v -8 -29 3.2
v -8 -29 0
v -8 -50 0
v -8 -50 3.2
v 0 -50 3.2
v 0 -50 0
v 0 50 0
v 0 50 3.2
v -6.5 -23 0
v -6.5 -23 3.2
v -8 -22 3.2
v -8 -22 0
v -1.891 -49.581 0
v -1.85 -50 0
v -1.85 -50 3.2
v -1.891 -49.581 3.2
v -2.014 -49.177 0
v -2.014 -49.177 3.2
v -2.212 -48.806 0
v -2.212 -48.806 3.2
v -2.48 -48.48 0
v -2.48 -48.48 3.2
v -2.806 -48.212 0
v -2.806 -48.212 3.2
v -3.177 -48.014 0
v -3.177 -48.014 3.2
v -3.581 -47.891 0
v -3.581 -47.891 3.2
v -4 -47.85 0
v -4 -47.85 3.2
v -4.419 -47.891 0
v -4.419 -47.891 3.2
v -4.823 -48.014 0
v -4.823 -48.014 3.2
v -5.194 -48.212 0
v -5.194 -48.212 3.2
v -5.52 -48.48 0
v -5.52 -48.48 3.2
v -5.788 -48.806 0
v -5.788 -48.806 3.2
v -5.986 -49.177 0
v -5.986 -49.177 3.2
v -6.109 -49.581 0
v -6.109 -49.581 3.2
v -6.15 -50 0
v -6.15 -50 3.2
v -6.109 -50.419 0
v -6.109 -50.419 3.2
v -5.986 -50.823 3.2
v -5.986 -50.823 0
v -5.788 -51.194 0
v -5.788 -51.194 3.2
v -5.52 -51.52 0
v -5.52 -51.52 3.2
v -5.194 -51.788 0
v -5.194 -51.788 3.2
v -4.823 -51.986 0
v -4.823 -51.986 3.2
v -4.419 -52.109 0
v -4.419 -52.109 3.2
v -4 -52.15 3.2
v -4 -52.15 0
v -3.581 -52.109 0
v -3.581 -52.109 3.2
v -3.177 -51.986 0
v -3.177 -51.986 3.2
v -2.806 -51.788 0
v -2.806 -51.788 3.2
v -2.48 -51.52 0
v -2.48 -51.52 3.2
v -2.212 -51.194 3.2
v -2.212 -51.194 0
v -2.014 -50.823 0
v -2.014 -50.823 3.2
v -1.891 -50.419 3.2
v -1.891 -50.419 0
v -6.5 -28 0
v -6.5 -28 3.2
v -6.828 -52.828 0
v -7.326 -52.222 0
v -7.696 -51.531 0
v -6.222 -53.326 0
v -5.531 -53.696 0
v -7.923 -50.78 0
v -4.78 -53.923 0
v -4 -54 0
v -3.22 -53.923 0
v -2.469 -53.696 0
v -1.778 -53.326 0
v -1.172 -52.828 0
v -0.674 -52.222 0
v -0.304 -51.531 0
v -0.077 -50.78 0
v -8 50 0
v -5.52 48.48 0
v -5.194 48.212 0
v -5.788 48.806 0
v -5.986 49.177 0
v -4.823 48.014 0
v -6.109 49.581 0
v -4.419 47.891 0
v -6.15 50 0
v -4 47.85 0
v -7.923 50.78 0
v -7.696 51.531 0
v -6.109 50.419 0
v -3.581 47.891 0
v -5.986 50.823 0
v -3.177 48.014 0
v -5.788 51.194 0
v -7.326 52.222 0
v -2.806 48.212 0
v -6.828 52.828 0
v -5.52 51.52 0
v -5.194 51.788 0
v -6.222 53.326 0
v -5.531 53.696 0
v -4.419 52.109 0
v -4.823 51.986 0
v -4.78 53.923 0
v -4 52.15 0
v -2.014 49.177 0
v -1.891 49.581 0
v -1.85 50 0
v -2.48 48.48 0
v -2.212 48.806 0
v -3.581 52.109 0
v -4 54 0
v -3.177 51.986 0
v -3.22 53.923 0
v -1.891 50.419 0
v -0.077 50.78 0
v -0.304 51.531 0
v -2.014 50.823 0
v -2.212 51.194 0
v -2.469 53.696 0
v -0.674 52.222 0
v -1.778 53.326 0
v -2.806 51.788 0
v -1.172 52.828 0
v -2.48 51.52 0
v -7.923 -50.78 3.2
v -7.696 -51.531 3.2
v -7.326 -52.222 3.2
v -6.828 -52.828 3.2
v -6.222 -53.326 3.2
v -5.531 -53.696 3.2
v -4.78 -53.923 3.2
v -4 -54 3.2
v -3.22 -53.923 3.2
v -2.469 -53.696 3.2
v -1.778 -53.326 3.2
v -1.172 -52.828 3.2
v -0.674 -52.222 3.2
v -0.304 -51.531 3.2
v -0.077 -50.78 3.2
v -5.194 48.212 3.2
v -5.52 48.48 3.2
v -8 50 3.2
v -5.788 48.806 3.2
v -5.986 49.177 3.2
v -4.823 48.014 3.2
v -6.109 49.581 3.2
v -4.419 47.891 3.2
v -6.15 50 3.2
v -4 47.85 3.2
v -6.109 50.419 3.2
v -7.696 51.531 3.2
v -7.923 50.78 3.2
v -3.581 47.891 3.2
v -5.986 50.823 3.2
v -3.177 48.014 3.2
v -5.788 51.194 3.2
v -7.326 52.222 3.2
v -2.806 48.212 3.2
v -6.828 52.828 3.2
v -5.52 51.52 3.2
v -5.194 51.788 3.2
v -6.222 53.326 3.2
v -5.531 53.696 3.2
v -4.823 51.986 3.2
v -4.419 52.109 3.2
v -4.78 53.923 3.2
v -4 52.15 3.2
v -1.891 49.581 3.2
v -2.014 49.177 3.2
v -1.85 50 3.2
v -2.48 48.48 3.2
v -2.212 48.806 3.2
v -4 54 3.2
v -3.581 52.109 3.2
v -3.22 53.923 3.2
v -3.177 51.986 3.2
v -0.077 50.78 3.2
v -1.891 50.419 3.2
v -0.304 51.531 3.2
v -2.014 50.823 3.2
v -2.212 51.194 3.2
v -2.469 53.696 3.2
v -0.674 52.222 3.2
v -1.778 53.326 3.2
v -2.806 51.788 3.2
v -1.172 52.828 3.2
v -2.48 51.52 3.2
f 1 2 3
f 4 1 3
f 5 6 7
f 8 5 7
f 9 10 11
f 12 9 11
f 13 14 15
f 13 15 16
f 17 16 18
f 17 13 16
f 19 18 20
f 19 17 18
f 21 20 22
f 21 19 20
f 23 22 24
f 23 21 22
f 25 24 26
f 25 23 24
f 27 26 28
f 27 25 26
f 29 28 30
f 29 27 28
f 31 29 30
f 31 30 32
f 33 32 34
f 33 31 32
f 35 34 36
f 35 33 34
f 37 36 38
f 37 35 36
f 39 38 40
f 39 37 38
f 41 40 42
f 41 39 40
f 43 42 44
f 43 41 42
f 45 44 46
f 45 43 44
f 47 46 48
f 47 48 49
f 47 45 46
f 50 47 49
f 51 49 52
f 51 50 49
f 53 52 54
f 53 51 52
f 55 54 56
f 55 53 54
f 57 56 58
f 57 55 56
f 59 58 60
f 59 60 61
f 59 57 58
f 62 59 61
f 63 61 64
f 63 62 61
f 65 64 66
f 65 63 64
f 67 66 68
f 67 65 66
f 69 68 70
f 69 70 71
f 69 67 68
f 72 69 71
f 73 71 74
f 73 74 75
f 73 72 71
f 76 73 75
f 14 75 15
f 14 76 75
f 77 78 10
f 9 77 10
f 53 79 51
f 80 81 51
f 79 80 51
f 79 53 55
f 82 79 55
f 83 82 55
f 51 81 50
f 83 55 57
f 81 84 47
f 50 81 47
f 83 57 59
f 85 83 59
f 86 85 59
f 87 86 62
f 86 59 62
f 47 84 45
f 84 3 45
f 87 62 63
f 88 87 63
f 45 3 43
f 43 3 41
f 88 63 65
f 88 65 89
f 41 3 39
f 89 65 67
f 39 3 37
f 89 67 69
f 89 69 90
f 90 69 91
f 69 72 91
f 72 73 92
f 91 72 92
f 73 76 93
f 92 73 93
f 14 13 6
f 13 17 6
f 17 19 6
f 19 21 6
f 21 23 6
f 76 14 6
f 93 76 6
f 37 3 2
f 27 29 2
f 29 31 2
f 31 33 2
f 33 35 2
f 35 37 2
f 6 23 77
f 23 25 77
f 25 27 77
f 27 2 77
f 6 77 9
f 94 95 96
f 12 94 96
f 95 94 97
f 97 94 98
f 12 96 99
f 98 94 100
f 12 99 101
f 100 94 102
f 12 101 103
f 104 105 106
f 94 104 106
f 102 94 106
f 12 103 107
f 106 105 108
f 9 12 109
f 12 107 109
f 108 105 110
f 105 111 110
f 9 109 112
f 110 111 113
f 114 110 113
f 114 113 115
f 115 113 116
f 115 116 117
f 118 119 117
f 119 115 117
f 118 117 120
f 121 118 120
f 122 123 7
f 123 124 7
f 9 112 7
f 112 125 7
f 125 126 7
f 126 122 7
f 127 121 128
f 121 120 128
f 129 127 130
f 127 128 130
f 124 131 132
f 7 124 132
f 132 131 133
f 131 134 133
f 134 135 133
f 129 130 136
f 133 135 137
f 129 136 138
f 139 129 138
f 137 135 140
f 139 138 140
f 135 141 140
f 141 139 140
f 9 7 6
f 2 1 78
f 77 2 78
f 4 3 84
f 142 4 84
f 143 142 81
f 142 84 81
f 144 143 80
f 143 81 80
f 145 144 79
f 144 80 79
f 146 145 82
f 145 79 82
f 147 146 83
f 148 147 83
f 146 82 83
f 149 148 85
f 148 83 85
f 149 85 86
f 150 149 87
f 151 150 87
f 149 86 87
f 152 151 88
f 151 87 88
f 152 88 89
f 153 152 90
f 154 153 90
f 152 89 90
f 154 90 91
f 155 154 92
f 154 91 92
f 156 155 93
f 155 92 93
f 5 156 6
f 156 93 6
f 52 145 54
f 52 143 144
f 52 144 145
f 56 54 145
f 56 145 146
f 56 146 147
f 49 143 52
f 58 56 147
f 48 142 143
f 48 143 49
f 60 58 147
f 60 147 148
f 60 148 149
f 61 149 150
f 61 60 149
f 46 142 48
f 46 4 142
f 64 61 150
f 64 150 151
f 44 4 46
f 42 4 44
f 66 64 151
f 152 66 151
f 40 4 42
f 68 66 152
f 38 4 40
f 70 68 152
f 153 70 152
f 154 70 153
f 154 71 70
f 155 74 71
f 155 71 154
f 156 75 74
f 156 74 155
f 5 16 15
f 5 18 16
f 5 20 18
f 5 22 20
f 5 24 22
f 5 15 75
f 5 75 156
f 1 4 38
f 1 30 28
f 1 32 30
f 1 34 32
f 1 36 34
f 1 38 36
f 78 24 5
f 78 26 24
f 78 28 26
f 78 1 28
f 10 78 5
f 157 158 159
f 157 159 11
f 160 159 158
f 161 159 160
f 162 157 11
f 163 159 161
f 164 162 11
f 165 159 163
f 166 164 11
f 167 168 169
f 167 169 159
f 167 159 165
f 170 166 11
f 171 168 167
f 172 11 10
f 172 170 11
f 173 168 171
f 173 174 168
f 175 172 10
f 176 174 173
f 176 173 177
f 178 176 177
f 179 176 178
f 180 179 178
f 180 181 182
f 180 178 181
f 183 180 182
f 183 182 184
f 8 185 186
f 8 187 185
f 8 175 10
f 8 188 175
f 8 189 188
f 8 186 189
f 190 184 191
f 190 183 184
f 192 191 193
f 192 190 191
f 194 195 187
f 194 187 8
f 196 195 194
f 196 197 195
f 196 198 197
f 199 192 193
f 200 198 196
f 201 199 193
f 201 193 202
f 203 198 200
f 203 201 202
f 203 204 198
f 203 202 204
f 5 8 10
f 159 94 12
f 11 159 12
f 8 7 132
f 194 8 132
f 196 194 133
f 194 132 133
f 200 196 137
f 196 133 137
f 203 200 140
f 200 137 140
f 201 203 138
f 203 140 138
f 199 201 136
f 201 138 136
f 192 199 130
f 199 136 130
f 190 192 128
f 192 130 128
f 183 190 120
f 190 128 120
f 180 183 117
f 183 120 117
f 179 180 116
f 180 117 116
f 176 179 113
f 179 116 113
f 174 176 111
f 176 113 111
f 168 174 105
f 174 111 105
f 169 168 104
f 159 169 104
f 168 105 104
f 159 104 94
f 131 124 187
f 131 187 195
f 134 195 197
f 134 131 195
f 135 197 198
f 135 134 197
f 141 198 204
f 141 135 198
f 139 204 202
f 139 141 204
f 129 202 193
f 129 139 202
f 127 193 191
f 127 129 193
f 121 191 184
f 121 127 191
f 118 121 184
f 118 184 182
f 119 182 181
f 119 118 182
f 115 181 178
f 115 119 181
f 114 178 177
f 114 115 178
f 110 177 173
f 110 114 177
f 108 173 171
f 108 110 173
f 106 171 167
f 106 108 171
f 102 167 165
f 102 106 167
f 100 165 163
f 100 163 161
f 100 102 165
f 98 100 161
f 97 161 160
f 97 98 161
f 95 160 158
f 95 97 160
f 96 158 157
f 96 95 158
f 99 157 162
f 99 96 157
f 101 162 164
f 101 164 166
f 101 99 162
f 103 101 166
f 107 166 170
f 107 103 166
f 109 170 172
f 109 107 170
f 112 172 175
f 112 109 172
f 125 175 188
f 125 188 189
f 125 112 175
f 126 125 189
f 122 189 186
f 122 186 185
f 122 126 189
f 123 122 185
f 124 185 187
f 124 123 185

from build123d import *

# Parameters (mm, degrees)
F0_R     = 2.15
F1_DEPTH = 3.2
F3_DEPTH = 12.5


with BuildPart() as f1:
    # F0 (on Top) → F1 (new body)
    with BuildSketch(Plane.XY):
        with BuildLine():
            ThreePointArc((-8, 50), (-4, 46), (0, 50))
            ThreePointArc((0, 50), (-4, 54), (-8, 50))
        make_face()
        with Locations((-4, 50)):
            Circle(F0_R, mode=Mode.SUBTRACT)
        with BuildLine():
            Line((0, -50), (0, 50))
            ThreePointArc((0, 50), (-4, 46), (-8, 50))
            Line((-8, 50), (-8, -50))
            ThreePointArc((-8, -50), (-4, -46), (0, -50))
        make_face()
        with BuildLine():
            ThreePointArc((-8, -50), (-4, -54), (0, -50))
            ThreePointArc((0, -50), (-4, -46), (-8, -50))
        make_face()
        with Locations((-4, -50)):
            Circle(F0_R, mode=Mode.SUBTRACT)
    extrude(amount=F1_DEPTH)

    # F2 (on Top) → F3 (cut, symmetric)
    with BuildSketch(Plane.XY):
        Polygon((-6.5, -23), (-8, -22), (-8, -29), (-6.5, -28), align=None)
    extrude(amount=F3_DEPTH, both=True, mode=Mode.SUBTRACT)


solid = f1.part
